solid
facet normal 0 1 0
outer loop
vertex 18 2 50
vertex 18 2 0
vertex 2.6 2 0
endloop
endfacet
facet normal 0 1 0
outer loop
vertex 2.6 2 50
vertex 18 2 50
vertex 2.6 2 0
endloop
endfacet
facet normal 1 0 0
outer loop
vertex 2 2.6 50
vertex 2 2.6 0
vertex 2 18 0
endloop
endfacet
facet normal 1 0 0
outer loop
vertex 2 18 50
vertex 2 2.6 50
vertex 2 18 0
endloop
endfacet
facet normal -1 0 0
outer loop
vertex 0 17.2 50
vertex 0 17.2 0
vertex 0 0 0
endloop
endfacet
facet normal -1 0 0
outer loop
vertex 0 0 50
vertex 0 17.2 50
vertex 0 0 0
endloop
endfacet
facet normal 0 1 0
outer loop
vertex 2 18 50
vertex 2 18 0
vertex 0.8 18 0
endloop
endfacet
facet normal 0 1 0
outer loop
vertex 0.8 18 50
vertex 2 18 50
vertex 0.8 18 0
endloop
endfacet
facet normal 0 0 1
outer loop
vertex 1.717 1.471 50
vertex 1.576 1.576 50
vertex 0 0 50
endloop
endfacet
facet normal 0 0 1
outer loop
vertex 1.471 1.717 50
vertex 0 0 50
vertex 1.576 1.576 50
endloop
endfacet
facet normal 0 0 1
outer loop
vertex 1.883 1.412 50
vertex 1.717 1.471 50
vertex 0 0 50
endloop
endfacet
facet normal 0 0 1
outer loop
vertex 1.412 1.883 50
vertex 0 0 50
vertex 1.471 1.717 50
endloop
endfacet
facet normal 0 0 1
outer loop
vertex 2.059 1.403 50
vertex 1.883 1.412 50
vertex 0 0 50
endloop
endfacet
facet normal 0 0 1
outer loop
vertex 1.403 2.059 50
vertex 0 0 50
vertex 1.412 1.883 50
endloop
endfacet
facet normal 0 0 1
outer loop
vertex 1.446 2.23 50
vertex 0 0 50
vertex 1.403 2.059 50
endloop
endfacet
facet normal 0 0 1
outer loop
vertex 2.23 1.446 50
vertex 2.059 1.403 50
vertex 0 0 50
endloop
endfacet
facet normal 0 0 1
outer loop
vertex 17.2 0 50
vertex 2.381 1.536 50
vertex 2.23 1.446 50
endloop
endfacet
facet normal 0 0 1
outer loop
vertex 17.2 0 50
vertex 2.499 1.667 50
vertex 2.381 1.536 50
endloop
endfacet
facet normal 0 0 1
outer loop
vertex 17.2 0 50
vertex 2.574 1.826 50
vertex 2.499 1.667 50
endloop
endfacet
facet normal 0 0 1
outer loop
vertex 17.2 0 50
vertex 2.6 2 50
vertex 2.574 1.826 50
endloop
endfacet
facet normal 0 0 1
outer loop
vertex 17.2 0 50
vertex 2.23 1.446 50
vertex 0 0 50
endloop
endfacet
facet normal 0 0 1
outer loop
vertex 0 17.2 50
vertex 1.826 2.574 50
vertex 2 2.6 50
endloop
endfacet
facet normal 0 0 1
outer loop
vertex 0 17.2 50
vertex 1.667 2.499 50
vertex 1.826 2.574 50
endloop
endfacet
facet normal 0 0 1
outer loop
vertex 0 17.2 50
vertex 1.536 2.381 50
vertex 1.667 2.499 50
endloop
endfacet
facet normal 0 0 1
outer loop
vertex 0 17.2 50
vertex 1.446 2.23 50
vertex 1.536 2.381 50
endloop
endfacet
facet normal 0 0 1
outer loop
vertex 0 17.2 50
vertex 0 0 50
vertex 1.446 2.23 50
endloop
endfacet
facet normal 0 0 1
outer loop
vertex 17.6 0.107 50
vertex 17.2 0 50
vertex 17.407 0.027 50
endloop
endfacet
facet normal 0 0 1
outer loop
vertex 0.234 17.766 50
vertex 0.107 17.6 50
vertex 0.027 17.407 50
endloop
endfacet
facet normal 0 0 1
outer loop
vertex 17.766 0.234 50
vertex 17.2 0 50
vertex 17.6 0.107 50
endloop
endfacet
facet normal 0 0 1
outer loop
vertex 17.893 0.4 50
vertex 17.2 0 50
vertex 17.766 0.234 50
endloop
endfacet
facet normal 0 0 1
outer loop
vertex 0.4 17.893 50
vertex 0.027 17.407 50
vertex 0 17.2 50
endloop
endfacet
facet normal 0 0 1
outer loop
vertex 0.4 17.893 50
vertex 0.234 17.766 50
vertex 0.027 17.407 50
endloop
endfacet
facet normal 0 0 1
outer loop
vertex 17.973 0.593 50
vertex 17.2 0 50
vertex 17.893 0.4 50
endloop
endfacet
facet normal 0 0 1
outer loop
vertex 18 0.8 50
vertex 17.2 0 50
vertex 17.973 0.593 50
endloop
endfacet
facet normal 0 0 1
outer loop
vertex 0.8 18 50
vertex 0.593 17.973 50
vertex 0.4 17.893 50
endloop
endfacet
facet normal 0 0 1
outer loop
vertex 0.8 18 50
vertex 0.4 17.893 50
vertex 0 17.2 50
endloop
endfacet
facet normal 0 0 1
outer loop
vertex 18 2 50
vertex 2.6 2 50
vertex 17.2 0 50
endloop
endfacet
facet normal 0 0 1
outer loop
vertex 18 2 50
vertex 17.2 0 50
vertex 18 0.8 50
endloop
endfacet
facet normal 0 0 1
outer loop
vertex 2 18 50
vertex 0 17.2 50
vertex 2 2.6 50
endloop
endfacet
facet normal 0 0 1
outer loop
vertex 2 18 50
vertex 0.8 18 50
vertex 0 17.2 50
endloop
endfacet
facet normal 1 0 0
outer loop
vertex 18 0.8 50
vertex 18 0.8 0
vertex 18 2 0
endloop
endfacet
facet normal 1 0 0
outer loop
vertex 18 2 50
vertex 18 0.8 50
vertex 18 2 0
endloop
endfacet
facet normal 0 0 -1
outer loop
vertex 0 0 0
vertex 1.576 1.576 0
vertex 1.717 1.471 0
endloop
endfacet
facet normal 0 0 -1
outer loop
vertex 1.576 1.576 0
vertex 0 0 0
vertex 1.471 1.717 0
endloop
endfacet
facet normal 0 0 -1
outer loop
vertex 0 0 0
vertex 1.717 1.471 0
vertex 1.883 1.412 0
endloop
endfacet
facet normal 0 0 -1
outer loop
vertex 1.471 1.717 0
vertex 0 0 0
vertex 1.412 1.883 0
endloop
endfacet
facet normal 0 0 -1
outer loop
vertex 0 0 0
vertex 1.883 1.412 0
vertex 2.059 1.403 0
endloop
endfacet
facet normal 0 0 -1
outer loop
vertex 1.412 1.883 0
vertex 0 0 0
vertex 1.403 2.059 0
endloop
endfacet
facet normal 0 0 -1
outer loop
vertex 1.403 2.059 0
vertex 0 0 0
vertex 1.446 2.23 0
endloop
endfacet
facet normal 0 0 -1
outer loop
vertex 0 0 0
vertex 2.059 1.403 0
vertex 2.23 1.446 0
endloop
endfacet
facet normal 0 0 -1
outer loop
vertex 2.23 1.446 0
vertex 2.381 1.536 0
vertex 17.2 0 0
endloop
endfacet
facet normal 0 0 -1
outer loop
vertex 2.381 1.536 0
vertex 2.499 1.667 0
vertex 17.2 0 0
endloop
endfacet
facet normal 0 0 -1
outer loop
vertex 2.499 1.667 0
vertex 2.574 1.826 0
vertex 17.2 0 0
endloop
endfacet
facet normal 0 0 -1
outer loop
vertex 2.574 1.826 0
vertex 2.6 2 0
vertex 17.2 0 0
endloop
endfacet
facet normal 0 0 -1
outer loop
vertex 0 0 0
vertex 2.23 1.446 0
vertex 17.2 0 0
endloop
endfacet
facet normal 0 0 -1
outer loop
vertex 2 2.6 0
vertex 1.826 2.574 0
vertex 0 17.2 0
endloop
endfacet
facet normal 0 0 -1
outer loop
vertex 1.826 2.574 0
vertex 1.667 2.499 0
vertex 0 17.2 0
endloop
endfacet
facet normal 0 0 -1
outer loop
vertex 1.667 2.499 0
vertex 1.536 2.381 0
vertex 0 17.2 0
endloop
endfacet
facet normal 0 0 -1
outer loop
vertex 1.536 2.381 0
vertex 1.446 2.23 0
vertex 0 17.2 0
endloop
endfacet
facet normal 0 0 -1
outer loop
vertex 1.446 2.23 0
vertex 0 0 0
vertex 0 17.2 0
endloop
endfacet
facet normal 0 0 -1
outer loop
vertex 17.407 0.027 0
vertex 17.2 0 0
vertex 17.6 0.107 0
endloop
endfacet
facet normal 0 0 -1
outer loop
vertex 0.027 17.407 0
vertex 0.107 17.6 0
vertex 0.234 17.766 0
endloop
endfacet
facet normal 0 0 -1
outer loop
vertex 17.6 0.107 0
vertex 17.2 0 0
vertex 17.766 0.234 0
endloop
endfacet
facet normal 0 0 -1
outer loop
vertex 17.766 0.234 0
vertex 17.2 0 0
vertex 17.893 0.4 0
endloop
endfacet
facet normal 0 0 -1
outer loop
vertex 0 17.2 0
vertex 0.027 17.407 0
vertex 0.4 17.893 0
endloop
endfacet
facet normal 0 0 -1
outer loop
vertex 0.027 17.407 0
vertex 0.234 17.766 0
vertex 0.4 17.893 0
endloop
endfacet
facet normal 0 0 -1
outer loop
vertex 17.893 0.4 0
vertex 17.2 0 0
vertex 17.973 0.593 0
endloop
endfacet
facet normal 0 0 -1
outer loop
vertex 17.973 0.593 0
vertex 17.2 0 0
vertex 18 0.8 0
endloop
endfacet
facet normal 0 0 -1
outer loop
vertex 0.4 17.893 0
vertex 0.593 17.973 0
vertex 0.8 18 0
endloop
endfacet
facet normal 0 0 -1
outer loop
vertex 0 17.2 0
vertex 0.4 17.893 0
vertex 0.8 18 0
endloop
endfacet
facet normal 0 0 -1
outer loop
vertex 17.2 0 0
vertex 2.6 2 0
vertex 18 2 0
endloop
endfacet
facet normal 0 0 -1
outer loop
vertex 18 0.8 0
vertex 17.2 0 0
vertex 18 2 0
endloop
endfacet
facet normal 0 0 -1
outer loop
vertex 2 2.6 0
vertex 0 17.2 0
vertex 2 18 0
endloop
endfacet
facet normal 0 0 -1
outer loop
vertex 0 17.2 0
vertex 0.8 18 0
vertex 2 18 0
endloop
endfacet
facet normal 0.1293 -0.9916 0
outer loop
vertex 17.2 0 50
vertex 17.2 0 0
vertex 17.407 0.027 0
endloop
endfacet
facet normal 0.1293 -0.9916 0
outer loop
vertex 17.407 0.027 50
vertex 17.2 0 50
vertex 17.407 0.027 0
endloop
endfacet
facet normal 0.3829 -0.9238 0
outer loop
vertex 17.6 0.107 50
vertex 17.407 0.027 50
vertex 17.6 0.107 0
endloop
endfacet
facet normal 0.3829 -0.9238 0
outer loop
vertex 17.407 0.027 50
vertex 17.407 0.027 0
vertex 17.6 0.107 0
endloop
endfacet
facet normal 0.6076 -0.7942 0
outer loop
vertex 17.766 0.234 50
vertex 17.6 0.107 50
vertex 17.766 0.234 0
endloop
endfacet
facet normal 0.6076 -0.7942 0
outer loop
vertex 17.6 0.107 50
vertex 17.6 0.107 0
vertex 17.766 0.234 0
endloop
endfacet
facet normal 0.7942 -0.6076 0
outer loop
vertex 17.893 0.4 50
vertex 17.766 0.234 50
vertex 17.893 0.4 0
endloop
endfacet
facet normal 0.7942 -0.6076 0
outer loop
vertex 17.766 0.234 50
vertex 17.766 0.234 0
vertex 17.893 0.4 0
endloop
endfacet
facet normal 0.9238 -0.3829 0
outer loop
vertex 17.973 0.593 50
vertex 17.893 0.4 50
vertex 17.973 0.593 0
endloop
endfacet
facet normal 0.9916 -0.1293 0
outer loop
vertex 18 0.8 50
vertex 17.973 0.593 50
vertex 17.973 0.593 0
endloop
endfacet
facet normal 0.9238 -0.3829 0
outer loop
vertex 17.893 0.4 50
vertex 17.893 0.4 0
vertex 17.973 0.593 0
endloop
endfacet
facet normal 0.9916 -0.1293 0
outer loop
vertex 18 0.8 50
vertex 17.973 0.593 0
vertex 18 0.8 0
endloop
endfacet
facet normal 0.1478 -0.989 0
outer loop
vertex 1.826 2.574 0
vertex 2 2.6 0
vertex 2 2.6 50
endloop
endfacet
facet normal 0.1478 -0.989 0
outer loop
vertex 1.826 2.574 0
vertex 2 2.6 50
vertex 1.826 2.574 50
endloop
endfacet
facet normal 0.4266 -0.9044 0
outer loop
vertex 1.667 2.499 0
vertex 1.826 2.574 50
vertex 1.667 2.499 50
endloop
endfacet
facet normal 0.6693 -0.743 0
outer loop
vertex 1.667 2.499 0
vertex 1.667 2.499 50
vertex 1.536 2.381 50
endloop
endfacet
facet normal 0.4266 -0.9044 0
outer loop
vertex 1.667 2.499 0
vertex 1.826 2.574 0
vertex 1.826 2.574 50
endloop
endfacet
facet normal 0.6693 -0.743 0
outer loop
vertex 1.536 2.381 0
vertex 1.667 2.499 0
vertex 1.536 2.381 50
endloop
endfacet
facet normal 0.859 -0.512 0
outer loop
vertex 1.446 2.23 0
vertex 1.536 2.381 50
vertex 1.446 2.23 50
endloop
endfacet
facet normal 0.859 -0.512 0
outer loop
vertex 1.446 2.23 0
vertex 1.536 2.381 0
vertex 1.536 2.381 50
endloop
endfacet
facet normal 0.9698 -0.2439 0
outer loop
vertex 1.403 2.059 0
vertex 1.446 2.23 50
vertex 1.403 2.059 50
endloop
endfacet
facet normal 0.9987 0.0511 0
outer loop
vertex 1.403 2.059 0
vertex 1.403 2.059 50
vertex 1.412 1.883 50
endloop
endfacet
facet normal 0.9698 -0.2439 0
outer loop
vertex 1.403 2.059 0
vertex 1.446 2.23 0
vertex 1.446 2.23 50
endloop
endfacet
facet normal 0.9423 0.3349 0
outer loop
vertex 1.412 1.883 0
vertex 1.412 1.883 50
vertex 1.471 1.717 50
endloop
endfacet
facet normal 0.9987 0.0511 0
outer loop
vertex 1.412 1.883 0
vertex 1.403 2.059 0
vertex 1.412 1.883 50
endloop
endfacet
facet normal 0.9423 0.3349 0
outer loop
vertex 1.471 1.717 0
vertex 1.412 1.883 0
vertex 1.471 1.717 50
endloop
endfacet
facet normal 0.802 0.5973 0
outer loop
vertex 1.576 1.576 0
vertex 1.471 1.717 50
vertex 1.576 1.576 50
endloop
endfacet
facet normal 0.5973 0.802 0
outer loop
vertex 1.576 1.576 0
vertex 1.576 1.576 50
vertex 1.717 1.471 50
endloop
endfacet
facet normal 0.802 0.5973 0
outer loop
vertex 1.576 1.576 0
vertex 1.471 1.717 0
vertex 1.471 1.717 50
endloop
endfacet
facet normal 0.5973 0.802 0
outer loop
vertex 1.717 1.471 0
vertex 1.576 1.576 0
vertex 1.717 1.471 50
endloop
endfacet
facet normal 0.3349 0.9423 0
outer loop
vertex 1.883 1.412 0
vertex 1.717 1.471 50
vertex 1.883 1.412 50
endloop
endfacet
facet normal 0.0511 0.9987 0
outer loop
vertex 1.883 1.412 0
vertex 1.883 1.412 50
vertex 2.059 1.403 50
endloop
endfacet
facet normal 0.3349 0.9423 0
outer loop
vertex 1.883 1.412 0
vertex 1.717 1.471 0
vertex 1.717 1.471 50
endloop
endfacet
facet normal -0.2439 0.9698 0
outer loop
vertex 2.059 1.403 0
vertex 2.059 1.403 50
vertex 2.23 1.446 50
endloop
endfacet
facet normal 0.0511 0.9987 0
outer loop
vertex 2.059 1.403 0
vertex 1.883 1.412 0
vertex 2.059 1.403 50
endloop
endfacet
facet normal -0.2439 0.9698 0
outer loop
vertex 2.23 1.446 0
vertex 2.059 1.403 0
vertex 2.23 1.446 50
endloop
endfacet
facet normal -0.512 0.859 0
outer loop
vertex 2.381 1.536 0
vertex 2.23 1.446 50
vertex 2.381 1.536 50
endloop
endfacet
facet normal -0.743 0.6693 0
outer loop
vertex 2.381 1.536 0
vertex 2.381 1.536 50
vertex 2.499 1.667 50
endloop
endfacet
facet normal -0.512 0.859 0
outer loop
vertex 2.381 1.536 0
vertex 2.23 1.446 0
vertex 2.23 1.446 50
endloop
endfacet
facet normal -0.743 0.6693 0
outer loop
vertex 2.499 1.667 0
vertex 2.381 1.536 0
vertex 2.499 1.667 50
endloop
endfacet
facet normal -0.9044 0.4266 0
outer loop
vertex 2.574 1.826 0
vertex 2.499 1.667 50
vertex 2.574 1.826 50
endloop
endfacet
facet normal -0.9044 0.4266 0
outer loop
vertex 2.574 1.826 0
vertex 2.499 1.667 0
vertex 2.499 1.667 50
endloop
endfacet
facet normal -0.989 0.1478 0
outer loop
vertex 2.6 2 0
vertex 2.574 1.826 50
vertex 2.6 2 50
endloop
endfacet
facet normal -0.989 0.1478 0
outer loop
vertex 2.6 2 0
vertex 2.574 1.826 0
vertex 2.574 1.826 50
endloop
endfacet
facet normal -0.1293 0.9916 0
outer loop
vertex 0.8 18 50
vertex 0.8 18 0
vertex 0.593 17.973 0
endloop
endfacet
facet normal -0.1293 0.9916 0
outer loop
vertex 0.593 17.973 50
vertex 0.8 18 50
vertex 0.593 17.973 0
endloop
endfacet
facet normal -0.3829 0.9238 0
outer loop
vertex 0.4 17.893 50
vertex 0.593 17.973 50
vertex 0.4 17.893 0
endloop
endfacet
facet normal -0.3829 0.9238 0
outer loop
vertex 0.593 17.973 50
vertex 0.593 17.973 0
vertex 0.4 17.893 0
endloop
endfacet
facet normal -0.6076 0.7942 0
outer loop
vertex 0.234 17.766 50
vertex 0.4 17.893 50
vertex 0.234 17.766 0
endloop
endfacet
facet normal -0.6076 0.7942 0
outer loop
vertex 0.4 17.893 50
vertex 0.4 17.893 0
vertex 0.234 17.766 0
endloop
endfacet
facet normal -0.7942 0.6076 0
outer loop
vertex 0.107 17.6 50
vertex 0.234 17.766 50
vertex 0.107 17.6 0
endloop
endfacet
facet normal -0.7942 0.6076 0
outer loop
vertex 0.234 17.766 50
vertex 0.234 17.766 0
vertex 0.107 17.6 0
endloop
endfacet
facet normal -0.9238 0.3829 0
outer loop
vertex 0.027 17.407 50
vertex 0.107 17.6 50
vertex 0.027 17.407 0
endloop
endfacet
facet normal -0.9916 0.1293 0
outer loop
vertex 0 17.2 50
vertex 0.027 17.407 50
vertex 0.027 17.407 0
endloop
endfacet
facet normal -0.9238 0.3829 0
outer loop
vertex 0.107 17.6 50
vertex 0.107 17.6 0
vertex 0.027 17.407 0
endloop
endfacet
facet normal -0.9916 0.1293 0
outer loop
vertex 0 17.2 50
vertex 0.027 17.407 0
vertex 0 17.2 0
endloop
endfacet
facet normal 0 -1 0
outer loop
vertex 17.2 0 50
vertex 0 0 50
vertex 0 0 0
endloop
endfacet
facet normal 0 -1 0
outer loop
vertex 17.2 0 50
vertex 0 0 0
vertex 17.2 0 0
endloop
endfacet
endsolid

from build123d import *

# Parameters (mm, degrees)
PAD_DEPTH = 50


with BuildPart() as part:
    # Sketch → Pad (new body)
    with BuildSketch(Plane.XY):
        with BuildLine():
            Line((0, 17.2), (0, 0))
            Line((0, 0), (17.2, 0))
            ThreePointArc((17.2, 0), (17.765685, 0.234315), (18, 0.8))
            Line((18, 0.8), (18, 2))
            Line((18, 2), (2.6, 2))
            ThreePointArc((2, 2.6), (1.575736, 1.575736), (2.6, 2))
            Line((2, 2.6), (2, 18))
            Line((2, 18), (0.8, 18))
            ThreePointArc((0.8, 18), (0.234315, 17.765685), (0, 17.2))
        make_face()
    extrude(amount=PAD_DEPTH)


solid = part.part
